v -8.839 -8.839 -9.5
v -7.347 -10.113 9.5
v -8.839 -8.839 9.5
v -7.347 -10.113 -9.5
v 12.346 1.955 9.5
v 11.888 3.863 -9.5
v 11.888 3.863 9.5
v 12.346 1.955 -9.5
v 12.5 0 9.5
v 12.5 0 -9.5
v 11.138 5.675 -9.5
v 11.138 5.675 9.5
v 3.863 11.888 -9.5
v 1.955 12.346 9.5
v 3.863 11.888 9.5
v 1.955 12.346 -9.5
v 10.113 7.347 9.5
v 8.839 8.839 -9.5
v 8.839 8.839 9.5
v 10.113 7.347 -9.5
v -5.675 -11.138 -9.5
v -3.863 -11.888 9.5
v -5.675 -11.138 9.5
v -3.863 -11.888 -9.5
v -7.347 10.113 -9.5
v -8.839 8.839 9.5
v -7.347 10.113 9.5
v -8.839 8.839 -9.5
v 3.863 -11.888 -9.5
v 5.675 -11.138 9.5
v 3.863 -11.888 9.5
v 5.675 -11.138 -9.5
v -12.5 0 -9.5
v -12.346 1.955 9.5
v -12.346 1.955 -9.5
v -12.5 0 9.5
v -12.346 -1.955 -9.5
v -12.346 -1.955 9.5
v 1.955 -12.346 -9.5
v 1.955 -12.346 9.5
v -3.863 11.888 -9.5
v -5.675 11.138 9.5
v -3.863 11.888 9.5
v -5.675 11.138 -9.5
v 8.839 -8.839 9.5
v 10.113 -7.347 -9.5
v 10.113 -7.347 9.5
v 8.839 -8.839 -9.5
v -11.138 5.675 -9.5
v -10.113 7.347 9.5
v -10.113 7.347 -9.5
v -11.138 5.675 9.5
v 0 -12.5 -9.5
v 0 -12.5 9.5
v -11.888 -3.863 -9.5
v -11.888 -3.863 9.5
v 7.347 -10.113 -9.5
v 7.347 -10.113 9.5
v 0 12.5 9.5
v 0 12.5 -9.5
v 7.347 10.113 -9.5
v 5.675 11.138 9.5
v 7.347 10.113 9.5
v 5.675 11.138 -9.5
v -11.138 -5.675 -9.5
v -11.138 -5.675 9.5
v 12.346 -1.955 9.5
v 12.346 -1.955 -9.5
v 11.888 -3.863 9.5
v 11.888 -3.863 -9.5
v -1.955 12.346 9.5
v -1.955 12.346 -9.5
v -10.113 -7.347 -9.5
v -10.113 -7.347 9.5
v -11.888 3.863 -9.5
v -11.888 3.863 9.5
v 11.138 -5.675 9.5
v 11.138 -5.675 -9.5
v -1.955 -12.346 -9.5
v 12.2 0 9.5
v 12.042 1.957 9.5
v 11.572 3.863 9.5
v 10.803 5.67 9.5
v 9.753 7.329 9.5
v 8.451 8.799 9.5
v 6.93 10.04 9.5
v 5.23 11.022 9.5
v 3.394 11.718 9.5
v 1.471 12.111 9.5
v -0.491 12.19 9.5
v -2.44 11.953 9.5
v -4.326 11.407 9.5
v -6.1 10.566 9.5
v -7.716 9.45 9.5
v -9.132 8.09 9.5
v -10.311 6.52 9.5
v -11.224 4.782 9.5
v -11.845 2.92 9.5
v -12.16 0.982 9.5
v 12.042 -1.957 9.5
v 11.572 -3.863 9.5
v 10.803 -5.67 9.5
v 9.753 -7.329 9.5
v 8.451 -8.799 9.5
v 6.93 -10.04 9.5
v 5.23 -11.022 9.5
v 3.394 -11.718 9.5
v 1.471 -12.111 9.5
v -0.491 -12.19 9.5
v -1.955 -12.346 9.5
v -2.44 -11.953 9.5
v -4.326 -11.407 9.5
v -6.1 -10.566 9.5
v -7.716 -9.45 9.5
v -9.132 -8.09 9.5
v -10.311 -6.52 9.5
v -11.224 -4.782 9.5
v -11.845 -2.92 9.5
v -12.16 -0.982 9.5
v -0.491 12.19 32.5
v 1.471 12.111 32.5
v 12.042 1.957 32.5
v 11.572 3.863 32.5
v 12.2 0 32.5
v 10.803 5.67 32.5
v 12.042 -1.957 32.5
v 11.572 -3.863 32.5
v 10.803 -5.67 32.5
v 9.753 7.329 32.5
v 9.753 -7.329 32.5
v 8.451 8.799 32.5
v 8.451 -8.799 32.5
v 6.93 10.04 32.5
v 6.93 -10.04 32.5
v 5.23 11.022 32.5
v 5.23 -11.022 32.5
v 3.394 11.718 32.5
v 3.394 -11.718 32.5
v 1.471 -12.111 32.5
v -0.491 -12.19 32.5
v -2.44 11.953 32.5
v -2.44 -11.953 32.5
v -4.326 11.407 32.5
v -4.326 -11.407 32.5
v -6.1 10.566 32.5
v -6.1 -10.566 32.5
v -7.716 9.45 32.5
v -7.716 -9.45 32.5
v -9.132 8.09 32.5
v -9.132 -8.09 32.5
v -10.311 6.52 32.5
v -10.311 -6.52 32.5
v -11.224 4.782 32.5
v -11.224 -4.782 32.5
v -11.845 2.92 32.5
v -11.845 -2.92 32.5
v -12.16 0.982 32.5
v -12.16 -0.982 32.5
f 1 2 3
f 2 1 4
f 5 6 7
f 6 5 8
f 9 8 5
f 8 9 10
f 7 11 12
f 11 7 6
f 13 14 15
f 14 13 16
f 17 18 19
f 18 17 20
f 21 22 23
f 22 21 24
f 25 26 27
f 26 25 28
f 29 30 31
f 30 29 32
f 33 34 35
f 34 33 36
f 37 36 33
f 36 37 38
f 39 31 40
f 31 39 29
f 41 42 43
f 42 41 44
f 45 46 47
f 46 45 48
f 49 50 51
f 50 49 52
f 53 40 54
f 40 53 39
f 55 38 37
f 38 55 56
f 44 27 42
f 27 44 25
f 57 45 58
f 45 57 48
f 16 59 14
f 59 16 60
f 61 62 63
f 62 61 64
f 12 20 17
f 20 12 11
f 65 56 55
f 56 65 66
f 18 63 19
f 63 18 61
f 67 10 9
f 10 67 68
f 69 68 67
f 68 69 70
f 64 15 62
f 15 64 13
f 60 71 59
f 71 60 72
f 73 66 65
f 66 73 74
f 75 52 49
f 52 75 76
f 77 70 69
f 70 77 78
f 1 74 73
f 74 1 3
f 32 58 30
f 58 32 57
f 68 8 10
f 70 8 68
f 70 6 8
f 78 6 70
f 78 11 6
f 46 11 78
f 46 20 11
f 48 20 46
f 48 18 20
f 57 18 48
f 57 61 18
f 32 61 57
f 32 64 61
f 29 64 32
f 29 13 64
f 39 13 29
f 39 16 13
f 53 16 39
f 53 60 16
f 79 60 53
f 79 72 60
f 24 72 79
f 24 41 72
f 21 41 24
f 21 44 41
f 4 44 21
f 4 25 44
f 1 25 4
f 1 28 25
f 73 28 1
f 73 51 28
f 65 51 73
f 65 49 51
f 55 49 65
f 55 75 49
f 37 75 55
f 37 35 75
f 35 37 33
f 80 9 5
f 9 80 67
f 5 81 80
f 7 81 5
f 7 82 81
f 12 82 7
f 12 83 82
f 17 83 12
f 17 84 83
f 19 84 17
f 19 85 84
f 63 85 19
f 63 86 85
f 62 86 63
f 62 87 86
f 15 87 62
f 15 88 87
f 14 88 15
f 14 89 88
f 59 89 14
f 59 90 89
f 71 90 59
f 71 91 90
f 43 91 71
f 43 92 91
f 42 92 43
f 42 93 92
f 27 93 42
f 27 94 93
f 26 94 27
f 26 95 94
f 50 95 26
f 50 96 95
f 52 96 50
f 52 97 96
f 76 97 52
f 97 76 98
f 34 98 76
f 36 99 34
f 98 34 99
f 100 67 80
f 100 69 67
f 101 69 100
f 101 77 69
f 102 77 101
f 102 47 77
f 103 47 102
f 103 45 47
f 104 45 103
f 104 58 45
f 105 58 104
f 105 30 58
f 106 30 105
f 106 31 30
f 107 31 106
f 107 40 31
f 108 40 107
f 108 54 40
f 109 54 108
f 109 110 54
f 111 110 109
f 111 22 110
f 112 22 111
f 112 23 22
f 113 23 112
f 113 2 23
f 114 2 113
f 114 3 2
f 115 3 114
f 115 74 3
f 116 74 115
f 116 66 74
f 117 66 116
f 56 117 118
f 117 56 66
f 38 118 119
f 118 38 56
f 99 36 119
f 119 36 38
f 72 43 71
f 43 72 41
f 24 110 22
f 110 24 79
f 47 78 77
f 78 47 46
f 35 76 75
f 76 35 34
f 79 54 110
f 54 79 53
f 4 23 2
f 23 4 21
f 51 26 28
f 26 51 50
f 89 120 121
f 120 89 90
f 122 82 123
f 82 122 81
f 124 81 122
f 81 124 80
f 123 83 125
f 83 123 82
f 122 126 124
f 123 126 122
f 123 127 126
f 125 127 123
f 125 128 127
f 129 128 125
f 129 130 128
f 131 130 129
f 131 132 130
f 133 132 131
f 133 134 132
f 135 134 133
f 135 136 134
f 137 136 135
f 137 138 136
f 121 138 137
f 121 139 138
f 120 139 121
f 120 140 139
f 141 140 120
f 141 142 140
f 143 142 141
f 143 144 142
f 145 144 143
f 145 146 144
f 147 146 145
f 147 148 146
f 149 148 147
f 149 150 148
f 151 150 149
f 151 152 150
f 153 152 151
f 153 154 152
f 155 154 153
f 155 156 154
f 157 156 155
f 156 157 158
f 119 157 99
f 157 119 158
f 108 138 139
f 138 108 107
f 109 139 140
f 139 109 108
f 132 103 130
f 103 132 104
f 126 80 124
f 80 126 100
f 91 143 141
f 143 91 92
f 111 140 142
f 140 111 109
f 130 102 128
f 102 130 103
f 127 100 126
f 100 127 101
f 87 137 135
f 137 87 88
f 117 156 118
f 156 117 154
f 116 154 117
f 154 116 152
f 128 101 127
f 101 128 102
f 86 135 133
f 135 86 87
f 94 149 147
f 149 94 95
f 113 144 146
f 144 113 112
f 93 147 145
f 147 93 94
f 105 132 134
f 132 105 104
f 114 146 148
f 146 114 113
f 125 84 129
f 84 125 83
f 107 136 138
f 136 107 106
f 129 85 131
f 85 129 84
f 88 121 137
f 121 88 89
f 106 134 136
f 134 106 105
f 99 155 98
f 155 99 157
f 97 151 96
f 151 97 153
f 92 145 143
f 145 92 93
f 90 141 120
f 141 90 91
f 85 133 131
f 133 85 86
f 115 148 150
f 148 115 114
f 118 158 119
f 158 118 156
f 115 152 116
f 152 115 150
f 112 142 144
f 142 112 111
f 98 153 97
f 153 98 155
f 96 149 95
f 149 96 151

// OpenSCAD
$fa = 5;
union(){
	cylinder(h=19,d=25,center=true);
	translate(0,0,19/2){
		cylinder(h=32.5,d=24.4);
}

}
